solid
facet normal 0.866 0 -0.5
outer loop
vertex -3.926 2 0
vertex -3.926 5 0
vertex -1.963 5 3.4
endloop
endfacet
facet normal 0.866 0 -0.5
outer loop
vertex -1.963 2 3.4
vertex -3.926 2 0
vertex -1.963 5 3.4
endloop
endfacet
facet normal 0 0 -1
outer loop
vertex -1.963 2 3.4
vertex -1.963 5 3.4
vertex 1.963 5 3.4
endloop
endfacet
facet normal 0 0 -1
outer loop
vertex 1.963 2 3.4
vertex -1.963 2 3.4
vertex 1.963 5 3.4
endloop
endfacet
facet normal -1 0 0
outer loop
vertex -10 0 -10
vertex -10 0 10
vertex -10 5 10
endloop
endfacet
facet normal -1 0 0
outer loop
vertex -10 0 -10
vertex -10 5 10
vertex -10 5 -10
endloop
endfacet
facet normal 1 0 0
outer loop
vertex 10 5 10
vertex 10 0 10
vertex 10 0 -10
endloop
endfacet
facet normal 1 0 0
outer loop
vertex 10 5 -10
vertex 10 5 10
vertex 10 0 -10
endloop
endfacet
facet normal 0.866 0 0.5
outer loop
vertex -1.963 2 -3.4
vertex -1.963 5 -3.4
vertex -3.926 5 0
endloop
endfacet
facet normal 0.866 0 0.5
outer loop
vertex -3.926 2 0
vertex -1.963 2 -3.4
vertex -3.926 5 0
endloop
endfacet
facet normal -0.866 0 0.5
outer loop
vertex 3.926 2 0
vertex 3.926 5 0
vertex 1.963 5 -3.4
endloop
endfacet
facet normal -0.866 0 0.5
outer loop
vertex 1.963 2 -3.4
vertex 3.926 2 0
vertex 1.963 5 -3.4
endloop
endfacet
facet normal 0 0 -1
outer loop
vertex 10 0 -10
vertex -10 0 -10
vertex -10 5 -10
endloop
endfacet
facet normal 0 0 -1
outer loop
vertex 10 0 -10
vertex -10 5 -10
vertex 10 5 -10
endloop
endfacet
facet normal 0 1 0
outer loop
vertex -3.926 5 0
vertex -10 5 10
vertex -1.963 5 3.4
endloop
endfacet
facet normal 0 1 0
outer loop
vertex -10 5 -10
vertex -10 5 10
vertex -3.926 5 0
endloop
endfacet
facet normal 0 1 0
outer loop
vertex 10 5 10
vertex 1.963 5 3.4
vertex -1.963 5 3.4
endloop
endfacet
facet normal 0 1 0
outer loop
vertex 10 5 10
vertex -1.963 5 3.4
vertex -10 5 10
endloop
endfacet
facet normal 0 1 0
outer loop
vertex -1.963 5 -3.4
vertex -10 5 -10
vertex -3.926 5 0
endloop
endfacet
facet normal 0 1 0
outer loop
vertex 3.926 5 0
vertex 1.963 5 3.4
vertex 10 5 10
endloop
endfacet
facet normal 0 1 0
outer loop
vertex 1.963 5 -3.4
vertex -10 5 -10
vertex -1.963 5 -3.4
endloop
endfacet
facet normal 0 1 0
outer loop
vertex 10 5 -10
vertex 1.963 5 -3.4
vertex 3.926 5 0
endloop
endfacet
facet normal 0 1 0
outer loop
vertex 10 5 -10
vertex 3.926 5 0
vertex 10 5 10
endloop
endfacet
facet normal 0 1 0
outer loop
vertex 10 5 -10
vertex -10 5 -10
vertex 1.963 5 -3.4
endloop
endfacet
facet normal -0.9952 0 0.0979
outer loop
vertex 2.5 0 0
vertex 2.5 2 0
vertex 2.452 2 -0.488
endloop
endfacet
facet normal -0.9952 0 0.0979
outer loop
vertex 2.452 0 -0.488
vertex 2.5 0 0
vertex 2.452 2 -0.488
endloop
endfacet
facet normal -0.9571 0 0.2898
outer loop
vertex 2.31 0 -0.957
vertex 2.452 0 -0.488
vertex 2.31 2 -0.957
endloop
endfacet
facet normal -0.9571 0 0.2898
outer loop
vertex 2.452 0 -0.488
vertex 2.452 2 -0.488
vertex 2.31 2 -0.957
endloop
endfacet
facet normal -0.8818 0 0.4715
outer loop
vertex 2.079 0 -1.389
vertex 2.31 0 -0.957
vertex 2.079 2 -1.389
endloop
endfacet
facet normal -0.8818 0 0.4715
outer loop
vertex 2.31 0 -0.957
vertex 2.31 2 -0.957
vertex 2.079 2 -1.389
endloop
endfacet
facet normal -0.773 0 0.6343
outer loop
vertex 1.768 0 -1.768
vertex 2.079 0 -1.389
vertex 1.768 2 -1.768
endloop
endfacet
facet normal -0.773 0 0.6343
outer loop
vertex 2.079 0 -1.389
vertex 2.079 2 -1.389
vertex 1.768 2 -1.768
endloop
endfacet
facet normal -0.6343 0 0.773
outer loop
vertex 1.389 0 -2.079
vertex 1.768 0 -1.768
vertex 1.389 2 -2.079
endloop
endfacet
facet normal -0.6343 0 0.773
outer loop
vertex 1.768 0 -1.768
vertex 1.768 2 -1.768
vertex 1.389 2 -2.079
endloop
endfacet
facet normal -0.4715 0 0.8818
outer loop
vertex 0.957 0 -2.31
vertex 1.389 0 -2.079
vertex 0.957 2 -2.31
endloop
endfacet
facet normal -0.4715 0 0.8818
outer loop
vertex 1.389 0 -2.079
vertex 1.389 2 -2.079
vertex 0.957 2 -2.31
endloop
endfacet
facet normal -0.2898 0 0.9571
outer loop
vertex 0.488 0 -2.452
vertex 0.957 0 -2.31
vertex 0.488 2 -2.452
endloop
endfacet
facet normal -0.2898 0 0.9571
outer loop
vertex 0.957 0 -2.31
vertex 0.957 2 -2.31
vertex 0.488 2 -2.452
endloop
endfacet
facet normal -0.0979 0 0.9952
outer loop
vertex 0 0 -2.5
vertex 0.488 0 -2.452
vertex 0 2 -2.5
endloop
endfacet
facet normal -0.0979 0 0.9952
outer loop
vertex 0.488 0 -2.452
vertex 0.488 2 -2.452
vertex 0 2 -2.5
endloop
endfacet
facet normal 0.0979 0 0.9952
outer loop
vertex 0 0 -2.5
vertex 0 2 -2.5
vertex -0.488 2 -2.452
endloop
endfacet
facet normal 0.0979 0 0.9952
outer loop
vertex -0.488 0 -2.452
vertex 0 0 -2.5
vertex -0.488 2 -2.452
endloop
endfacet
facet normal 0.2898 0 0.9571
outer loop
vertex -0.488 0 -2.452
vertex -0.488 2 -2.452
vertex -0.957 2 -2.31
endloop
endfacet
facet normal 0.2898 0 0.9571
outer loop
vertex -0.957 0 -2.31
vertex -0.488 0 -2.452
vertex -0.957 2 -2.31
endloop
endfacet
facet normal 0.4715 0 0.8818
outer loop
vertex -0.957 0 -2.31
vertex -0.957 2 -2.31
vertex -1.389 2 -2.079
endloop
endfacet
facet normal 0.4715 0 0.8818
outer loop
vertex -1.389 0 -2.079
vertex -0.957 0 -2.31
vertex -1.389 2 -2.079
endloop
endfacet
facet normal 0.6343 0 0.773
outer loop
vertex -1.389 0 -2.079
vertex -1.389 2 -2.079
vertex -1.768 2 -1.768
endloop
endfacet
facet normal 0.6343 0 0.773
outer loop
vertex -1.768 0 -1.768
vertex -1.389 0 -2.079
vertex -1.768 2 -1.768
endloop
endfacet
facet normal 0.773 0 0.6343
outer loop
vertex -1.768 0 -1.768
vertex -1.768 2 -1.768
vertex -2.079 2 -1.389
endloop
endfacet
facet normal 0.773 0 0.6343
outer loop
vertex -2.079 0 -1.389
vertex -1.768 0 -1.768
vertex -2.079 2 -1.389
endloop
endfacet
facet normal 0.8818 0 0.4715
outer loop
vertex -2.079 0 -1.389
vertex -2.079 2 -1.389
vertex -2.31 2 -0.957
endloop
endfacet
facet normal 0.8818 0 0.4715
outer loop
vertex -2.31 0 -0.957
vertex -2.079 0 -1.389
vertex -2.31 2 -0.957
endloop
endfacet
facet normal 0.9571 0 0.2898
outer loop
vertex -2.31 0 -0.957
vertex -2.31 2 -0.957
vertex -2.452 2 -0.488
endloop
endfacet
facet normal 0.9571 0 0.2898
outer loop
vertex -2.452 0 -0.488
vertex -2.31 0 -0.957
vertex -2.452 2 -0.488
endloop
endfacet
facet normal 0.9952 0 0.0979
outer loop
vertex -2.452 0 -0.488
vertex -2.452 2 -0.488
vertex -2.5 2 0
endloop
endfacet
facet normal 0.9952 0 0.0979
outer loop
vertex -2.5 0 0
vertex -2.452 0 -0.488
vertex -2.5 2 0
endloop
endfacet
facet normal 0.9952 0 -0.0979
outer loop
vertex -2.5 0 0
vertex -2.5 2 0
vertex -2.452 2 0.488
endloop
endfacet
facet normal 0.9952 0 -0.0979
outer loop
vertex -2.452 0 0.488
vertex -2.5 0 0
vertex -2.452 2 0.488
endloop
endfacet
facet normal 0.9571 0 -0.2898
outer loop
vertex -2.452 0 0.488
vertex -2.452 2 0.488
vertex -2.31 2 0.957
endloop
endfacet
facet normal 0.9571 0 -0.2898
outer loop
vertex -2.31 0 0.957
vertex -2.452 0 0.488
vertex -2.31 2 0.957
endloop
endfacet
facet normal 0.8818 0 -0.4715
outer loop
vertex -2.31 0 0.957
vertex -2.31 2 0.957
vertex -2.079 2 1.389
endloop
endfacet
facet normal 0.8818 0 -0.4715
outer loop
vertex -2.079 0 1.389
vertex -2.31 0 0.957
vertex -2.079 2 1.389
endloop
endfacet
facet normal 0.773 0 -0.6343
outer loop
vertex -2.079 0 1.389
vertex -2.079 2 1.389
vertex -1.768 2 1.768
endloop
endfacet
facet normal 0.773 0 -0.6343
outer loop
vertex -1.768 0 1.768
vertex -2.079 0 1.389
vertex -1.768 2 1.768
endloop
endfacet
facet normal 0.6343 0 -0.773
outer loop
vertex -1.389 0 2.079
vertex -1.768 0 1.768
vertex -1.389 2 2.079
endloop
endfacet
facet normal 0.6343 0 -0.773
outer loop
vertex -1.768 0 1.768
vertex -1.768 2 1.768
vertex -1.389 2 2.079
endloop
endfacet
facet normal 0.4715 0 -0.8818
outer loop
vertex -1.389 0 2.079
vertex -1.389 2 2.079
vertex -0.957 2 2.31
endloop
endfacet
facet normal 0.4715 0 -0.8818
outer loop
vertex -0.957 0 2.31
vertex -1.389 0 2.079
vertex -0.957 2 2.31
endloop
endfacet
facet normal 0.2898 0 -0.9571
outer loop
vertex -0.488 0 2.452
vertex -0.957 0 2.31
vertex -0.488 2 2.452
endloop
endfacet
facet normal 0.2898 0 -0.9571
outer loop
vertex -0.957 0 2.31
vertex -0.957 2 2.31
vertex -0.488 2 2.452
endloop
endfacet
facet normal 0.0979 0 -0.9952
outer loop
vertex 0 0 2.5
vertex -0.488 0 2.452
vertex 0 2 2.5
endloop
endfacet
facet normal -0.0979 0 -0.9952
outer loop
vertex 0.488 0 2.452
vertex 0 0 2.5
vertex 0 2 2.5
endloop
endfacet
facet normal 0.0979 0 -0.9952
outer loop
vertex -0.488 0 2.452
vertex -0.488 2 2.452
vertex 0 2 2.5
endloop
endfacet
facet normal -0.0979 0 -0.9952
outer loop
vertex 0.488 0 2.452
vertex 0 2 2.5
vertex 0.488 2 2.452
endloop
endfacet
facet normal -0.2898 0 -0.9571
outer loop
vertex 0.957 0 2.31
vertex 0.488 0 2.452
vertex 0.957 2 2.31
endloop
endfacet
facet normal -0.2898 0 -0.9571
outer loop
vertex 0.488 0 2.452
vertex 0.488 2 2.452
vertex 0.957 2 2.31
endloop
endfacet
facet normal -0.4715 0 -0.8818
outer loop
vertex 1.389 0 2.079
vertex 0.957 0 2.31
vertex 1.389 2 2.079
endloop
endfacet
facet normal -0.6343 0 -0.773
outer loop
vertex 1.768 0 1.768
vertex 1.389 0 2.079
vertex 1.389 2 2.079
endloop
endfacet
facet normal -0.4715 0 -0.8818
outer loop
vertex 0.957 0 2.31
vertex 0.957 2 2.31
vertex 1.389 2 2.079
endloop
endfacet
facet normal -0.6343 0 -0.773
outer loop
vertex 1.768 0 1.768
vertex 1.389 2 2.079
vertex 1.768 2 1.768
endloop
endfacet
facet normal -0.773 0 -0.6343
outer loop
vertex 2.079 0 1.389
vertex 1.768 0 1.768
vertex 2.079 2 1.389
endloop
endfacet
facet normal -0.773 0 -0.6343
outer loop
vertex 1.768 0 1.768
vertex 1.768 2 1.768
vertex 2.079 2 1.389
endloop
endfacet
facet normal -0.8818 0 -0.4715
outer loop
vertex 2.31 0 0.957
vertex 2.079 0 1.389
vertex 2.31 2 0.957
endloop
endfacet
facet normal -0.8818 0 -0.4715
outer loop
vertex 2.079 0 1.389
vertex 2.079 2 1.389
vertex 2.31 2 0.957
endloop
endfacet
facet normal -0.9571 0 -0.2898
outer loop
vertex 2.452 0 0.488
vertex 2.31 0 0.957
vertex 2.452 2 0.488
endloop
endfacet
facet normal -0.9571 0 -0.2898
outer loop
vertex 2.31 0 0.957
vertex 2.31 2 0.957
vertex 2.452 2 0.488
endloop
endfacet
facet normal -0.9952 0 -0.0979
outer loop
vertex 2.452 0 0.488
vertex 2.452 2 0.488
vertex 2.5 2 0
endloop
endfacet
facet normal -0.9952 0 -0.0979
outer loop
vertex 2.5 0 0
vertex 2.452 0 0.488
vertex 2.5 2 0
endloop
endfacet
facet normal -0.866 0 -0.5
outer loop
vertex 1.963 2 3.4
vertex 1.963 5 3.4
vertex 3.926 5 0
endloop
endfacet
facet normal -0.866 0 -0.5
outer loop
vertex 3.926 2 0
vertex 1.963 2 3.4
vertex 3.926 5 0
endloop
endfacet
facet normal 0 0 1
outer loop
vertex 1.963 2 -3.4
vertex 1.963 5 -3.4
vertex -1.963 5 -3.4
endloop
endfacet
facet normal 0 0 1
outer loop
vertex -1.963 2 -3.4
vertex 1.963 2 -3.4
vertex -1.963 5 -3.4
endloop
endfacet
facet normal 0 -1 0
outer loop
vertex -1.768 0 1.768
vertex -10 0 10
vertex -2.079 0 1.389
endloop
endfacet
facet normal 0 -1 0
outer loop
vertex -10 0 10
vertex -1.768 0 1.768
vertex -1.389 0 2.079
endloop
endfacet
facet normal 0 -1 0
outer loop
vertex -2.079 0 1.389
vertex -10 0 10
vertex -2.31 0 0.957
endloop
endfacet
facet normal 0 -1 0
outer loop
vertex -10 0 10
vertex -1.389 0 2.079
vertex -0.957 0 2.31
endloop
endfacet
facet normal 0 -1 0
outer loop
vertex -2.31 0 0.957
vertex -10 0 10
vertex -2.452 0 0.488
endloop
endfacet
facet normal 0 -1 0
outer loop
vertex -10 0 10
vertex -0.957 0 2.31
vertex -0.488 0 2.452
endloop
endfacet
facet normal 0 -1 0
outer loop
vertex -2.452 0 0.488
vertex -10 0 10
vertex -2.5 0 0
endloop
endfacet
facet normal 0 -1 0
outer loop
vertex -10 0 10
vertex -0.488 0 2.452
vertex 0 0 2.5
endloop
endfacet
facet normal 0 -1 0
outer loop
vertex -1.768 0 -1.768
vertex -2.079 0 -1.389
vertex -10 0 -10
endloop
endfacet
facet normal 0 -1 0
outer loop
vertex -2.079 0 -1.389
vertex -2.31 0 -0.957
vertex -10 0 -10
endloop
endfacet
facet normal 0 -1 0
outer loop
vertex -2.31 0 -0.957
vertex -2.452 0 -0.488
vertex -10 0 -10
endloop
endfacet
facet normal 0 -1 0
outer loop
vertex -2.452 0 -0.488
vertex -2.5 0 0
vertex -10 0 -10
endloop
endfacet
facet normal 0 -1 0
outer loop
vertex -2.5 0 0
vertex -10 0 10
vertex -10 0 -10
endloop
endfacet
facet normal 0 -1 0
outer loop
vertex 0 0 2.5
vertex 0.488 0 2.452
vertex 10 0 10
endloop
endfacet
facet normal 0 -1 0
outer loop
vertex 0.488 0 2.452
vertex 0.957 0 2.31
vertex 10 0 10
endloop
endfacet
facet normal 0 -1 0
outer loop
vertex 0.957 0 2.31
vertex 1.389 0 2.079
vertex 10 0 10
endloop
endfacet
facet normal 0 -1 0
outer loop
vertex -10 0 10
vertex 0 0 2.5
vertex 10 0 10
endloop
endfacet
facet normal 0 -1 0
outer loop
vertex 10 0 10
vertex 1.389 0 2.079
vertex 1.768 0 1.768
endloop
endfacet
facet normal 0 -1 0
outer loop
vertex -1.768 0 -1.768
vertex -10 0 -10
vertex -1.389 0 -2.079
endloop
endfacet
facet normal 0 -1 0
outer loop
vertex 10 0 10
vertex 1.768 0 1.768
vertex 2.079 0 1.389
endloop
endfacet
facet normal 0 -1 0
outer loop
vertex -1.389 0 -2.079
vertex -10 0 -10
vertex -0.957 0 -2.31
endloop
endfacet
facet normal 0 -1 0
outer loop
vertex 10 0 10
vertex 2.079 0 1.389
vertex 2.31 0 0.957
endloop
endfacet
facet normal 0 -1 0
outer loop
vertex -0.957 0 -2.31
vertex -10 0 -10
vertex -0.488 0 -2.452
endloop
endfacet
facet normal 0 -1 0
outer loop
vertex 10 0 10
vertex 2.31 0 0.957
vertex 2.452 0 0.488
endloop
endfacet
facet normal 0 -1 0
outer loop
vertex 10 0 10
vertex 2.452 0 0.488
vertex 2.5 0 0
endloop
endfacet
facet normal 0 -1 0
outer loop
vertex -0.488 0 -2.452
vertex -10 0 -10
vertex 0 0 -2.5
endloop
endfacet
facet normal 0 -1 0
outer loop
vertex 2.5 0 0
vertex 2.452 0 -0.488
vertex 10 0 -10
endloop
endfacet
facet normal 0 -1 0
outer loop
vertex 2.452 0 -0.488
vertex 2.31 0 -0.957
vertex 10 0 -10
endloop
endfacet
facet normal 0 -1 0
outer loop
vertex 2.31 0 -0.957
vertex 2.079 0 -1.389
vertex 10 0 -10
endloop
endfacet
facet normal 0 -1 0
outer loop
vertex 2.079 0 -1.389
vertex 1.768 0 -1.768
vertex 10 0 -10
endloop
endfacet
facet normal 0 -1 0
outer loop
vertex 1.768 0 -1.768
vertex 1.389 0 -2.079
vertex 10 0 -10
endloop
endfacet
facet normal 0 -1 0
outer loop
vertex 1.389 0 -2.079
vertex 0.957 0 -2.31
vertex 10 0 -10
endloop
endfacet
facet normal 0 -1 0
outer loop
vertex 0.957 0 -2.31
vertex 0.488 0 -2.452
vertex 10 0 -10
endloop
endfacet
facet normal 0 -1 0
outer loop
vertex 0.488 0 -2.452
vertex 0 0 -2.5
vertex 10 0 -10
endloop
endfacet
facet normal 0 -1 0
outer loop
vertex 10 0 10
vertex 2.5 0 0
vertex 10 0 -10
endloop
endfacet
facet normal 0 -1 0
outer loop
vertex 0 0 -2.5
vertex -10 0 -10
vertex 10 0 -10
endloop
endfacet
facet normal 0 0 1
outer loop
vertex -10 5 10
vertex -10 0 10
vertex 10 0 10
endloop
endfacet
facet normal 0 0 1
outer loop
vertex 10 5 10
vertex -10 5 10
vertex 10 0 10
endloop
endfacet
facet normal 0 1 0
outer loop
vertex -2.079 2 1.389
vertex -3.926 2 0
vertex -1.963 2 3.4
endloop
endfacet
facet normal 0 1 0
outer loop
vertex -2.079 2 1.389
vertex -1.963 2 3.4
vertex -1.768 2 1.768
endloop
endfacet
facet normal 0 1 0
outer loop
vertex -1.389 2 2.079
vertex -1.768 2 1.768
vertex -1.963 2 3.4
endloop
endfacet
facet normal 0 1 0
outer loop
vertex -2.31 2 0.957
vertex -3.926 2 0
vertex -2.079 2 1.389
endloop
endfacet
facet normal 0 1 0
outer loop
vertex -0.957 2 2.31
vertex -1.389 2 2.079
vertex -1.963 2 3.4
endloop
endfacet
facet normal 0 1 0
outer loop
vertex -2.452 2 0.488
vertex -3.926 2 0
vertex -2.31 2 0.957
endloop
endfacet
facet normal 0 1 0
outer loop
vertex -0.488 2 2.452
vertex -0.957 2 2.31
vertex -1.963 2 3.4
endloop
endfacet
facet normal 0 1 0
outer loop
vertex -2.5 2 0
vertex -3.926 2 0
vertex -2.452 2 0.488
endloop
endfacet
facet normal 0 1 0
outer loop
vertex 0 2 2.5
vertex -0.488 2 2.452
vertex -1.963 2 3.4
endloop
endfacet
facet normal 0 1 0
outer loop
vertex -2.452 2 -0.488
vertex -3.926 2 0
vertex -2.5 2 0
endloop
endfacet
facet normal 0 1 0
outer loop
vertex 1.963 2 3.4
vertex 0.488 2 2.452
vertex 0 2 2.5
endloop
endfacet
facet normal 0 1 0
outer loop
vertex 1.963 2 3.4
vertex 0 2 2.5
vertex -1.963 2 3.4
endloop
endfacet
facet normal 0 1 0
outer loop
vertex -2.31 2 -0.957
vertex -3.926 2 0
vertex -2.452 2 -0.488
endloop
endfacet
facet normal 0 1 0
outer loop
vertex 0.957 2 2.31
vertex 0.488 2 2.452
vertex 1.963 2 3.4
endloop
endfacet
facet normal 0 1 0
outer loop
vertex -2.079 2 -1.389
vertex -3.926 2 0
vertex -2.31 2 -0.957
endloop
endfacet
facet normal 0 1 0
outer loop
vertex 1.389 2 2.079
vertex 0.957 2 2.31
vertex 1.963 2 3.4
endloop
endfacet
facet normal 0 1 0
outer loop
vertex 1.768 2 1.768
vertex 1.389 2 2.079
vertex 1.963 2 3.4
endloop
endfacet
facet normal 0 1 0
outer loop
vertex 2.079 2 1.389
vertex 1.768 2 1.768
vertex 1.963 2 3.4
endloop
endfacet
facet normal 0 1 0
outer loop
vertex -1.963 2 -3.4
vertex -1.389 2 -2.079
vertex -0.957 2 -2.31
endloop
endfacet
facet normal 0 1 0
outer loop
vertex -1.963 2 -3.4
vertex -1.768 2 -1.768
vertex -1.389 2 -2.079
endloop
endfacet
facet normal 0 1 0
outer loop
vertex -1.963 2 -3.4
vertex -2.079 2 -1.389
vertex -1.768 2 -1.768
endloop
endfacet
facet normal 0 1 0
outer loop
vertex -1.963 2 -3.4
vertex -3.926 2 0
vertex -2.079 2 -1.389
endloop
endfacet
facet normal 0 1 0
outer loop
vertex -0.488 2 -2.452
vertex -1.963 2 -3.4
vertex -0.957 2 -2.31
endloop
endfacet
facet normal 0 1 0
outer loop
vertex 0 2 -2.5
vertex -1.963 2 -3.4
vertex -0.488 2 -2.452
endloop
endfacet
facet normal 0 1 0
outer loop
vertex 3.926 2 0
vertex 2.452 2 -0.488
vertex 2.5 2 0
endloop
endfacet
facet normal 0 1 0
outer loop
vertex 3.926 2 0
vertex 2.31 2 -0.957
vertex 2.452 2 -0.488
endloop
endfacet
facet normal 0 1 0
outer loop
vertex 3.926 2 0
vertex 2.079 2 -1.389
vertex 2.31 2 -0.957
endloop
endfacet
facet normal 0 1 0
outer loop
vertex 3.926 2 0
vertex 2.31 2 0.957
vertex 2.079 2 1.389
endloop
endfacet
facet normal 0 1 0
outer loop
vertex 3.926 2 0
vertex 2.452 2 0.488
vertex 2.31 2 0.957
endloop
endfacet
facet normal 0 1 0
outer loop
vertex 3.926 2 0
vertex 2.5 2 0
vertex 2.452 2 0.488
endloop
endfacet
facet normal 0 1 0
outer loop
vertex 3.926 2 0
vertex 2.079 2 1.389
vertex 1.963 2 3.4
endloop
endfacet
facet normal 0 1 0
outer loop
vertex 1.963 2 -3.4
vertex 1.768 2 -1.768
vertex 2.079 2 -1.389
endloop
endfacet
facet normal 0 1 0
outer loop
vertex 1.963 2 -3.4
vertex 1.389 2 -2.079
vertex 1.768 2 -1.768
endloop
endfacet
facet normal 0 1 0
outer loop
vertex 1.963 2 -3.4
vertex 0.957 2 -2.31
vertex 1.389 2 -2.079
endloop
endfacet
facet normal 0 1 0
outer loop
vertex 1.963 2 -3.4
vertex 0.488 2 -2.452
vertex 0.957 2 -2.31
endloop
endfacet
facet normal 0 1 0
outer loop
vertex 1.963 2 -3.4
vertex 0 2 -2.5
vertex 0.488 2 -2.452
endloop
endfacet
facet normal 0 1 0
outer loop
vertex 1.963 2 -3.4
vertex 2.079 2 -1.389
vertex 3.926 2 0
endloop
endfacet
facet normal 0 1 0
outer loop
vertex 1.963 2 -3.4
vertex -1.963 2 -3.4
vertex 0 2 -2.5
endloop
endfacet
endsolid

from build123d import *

# Parameters (mm, degrees)
SKETCH1_W           = 20
SKETCH1_H           = 20
BOSS_EXTRUDE1_DEPTH = 5
CUT_EXTRUDE1_DEPTH  = 3
SKETCH4_R           = 2.5
CUT_EXTRUDE2_DEPTH  = 3


with BuildPart() as part:
    # Sketch1 → Boss-Extrude1 (new body)
    with BuildSketch(Plane(origin=(0, 0, 0), x_dir=(1, 0, 0), z_dir=(0, 1, 0))):
        Rectangle(SKETCH1_W, SKETCH1_H)
    extrude(amount=BOSS_EXTRUDE1_DEPTH)

    # Sketch3 → Cut-Extrude1 (cut)
    with BuildSketch(Plane(origin=(0, 5, 0), x_dir=(1, 0, 0), z_dir=(0, 1, 0))):
        Polygon((3.92598183, 0), (1.962990915, 3.4), (-1.962990915, 3.4), (-3.92598183, 0), (-1.962990915, -3.4), (1.962990915, -3.4), align=None)
    extrude(amount=-CUT_EXTRUDE1_DEPTH, mode=Mode.SUBTRACT)

    # Sketch4 → Cut-Extrude2 (cut, through all)
    with BuildSketch(Plane(origin=(0, 2, 0), x_dir=(1, 0, 0), z_dir=(0, 1, 0))):
        Circle(SKETCH4_R)
    extrude(amount=-CUT_EXTRUDE2_DEPTH, mode=Mode.SUBTRACT)


solid = part.part
